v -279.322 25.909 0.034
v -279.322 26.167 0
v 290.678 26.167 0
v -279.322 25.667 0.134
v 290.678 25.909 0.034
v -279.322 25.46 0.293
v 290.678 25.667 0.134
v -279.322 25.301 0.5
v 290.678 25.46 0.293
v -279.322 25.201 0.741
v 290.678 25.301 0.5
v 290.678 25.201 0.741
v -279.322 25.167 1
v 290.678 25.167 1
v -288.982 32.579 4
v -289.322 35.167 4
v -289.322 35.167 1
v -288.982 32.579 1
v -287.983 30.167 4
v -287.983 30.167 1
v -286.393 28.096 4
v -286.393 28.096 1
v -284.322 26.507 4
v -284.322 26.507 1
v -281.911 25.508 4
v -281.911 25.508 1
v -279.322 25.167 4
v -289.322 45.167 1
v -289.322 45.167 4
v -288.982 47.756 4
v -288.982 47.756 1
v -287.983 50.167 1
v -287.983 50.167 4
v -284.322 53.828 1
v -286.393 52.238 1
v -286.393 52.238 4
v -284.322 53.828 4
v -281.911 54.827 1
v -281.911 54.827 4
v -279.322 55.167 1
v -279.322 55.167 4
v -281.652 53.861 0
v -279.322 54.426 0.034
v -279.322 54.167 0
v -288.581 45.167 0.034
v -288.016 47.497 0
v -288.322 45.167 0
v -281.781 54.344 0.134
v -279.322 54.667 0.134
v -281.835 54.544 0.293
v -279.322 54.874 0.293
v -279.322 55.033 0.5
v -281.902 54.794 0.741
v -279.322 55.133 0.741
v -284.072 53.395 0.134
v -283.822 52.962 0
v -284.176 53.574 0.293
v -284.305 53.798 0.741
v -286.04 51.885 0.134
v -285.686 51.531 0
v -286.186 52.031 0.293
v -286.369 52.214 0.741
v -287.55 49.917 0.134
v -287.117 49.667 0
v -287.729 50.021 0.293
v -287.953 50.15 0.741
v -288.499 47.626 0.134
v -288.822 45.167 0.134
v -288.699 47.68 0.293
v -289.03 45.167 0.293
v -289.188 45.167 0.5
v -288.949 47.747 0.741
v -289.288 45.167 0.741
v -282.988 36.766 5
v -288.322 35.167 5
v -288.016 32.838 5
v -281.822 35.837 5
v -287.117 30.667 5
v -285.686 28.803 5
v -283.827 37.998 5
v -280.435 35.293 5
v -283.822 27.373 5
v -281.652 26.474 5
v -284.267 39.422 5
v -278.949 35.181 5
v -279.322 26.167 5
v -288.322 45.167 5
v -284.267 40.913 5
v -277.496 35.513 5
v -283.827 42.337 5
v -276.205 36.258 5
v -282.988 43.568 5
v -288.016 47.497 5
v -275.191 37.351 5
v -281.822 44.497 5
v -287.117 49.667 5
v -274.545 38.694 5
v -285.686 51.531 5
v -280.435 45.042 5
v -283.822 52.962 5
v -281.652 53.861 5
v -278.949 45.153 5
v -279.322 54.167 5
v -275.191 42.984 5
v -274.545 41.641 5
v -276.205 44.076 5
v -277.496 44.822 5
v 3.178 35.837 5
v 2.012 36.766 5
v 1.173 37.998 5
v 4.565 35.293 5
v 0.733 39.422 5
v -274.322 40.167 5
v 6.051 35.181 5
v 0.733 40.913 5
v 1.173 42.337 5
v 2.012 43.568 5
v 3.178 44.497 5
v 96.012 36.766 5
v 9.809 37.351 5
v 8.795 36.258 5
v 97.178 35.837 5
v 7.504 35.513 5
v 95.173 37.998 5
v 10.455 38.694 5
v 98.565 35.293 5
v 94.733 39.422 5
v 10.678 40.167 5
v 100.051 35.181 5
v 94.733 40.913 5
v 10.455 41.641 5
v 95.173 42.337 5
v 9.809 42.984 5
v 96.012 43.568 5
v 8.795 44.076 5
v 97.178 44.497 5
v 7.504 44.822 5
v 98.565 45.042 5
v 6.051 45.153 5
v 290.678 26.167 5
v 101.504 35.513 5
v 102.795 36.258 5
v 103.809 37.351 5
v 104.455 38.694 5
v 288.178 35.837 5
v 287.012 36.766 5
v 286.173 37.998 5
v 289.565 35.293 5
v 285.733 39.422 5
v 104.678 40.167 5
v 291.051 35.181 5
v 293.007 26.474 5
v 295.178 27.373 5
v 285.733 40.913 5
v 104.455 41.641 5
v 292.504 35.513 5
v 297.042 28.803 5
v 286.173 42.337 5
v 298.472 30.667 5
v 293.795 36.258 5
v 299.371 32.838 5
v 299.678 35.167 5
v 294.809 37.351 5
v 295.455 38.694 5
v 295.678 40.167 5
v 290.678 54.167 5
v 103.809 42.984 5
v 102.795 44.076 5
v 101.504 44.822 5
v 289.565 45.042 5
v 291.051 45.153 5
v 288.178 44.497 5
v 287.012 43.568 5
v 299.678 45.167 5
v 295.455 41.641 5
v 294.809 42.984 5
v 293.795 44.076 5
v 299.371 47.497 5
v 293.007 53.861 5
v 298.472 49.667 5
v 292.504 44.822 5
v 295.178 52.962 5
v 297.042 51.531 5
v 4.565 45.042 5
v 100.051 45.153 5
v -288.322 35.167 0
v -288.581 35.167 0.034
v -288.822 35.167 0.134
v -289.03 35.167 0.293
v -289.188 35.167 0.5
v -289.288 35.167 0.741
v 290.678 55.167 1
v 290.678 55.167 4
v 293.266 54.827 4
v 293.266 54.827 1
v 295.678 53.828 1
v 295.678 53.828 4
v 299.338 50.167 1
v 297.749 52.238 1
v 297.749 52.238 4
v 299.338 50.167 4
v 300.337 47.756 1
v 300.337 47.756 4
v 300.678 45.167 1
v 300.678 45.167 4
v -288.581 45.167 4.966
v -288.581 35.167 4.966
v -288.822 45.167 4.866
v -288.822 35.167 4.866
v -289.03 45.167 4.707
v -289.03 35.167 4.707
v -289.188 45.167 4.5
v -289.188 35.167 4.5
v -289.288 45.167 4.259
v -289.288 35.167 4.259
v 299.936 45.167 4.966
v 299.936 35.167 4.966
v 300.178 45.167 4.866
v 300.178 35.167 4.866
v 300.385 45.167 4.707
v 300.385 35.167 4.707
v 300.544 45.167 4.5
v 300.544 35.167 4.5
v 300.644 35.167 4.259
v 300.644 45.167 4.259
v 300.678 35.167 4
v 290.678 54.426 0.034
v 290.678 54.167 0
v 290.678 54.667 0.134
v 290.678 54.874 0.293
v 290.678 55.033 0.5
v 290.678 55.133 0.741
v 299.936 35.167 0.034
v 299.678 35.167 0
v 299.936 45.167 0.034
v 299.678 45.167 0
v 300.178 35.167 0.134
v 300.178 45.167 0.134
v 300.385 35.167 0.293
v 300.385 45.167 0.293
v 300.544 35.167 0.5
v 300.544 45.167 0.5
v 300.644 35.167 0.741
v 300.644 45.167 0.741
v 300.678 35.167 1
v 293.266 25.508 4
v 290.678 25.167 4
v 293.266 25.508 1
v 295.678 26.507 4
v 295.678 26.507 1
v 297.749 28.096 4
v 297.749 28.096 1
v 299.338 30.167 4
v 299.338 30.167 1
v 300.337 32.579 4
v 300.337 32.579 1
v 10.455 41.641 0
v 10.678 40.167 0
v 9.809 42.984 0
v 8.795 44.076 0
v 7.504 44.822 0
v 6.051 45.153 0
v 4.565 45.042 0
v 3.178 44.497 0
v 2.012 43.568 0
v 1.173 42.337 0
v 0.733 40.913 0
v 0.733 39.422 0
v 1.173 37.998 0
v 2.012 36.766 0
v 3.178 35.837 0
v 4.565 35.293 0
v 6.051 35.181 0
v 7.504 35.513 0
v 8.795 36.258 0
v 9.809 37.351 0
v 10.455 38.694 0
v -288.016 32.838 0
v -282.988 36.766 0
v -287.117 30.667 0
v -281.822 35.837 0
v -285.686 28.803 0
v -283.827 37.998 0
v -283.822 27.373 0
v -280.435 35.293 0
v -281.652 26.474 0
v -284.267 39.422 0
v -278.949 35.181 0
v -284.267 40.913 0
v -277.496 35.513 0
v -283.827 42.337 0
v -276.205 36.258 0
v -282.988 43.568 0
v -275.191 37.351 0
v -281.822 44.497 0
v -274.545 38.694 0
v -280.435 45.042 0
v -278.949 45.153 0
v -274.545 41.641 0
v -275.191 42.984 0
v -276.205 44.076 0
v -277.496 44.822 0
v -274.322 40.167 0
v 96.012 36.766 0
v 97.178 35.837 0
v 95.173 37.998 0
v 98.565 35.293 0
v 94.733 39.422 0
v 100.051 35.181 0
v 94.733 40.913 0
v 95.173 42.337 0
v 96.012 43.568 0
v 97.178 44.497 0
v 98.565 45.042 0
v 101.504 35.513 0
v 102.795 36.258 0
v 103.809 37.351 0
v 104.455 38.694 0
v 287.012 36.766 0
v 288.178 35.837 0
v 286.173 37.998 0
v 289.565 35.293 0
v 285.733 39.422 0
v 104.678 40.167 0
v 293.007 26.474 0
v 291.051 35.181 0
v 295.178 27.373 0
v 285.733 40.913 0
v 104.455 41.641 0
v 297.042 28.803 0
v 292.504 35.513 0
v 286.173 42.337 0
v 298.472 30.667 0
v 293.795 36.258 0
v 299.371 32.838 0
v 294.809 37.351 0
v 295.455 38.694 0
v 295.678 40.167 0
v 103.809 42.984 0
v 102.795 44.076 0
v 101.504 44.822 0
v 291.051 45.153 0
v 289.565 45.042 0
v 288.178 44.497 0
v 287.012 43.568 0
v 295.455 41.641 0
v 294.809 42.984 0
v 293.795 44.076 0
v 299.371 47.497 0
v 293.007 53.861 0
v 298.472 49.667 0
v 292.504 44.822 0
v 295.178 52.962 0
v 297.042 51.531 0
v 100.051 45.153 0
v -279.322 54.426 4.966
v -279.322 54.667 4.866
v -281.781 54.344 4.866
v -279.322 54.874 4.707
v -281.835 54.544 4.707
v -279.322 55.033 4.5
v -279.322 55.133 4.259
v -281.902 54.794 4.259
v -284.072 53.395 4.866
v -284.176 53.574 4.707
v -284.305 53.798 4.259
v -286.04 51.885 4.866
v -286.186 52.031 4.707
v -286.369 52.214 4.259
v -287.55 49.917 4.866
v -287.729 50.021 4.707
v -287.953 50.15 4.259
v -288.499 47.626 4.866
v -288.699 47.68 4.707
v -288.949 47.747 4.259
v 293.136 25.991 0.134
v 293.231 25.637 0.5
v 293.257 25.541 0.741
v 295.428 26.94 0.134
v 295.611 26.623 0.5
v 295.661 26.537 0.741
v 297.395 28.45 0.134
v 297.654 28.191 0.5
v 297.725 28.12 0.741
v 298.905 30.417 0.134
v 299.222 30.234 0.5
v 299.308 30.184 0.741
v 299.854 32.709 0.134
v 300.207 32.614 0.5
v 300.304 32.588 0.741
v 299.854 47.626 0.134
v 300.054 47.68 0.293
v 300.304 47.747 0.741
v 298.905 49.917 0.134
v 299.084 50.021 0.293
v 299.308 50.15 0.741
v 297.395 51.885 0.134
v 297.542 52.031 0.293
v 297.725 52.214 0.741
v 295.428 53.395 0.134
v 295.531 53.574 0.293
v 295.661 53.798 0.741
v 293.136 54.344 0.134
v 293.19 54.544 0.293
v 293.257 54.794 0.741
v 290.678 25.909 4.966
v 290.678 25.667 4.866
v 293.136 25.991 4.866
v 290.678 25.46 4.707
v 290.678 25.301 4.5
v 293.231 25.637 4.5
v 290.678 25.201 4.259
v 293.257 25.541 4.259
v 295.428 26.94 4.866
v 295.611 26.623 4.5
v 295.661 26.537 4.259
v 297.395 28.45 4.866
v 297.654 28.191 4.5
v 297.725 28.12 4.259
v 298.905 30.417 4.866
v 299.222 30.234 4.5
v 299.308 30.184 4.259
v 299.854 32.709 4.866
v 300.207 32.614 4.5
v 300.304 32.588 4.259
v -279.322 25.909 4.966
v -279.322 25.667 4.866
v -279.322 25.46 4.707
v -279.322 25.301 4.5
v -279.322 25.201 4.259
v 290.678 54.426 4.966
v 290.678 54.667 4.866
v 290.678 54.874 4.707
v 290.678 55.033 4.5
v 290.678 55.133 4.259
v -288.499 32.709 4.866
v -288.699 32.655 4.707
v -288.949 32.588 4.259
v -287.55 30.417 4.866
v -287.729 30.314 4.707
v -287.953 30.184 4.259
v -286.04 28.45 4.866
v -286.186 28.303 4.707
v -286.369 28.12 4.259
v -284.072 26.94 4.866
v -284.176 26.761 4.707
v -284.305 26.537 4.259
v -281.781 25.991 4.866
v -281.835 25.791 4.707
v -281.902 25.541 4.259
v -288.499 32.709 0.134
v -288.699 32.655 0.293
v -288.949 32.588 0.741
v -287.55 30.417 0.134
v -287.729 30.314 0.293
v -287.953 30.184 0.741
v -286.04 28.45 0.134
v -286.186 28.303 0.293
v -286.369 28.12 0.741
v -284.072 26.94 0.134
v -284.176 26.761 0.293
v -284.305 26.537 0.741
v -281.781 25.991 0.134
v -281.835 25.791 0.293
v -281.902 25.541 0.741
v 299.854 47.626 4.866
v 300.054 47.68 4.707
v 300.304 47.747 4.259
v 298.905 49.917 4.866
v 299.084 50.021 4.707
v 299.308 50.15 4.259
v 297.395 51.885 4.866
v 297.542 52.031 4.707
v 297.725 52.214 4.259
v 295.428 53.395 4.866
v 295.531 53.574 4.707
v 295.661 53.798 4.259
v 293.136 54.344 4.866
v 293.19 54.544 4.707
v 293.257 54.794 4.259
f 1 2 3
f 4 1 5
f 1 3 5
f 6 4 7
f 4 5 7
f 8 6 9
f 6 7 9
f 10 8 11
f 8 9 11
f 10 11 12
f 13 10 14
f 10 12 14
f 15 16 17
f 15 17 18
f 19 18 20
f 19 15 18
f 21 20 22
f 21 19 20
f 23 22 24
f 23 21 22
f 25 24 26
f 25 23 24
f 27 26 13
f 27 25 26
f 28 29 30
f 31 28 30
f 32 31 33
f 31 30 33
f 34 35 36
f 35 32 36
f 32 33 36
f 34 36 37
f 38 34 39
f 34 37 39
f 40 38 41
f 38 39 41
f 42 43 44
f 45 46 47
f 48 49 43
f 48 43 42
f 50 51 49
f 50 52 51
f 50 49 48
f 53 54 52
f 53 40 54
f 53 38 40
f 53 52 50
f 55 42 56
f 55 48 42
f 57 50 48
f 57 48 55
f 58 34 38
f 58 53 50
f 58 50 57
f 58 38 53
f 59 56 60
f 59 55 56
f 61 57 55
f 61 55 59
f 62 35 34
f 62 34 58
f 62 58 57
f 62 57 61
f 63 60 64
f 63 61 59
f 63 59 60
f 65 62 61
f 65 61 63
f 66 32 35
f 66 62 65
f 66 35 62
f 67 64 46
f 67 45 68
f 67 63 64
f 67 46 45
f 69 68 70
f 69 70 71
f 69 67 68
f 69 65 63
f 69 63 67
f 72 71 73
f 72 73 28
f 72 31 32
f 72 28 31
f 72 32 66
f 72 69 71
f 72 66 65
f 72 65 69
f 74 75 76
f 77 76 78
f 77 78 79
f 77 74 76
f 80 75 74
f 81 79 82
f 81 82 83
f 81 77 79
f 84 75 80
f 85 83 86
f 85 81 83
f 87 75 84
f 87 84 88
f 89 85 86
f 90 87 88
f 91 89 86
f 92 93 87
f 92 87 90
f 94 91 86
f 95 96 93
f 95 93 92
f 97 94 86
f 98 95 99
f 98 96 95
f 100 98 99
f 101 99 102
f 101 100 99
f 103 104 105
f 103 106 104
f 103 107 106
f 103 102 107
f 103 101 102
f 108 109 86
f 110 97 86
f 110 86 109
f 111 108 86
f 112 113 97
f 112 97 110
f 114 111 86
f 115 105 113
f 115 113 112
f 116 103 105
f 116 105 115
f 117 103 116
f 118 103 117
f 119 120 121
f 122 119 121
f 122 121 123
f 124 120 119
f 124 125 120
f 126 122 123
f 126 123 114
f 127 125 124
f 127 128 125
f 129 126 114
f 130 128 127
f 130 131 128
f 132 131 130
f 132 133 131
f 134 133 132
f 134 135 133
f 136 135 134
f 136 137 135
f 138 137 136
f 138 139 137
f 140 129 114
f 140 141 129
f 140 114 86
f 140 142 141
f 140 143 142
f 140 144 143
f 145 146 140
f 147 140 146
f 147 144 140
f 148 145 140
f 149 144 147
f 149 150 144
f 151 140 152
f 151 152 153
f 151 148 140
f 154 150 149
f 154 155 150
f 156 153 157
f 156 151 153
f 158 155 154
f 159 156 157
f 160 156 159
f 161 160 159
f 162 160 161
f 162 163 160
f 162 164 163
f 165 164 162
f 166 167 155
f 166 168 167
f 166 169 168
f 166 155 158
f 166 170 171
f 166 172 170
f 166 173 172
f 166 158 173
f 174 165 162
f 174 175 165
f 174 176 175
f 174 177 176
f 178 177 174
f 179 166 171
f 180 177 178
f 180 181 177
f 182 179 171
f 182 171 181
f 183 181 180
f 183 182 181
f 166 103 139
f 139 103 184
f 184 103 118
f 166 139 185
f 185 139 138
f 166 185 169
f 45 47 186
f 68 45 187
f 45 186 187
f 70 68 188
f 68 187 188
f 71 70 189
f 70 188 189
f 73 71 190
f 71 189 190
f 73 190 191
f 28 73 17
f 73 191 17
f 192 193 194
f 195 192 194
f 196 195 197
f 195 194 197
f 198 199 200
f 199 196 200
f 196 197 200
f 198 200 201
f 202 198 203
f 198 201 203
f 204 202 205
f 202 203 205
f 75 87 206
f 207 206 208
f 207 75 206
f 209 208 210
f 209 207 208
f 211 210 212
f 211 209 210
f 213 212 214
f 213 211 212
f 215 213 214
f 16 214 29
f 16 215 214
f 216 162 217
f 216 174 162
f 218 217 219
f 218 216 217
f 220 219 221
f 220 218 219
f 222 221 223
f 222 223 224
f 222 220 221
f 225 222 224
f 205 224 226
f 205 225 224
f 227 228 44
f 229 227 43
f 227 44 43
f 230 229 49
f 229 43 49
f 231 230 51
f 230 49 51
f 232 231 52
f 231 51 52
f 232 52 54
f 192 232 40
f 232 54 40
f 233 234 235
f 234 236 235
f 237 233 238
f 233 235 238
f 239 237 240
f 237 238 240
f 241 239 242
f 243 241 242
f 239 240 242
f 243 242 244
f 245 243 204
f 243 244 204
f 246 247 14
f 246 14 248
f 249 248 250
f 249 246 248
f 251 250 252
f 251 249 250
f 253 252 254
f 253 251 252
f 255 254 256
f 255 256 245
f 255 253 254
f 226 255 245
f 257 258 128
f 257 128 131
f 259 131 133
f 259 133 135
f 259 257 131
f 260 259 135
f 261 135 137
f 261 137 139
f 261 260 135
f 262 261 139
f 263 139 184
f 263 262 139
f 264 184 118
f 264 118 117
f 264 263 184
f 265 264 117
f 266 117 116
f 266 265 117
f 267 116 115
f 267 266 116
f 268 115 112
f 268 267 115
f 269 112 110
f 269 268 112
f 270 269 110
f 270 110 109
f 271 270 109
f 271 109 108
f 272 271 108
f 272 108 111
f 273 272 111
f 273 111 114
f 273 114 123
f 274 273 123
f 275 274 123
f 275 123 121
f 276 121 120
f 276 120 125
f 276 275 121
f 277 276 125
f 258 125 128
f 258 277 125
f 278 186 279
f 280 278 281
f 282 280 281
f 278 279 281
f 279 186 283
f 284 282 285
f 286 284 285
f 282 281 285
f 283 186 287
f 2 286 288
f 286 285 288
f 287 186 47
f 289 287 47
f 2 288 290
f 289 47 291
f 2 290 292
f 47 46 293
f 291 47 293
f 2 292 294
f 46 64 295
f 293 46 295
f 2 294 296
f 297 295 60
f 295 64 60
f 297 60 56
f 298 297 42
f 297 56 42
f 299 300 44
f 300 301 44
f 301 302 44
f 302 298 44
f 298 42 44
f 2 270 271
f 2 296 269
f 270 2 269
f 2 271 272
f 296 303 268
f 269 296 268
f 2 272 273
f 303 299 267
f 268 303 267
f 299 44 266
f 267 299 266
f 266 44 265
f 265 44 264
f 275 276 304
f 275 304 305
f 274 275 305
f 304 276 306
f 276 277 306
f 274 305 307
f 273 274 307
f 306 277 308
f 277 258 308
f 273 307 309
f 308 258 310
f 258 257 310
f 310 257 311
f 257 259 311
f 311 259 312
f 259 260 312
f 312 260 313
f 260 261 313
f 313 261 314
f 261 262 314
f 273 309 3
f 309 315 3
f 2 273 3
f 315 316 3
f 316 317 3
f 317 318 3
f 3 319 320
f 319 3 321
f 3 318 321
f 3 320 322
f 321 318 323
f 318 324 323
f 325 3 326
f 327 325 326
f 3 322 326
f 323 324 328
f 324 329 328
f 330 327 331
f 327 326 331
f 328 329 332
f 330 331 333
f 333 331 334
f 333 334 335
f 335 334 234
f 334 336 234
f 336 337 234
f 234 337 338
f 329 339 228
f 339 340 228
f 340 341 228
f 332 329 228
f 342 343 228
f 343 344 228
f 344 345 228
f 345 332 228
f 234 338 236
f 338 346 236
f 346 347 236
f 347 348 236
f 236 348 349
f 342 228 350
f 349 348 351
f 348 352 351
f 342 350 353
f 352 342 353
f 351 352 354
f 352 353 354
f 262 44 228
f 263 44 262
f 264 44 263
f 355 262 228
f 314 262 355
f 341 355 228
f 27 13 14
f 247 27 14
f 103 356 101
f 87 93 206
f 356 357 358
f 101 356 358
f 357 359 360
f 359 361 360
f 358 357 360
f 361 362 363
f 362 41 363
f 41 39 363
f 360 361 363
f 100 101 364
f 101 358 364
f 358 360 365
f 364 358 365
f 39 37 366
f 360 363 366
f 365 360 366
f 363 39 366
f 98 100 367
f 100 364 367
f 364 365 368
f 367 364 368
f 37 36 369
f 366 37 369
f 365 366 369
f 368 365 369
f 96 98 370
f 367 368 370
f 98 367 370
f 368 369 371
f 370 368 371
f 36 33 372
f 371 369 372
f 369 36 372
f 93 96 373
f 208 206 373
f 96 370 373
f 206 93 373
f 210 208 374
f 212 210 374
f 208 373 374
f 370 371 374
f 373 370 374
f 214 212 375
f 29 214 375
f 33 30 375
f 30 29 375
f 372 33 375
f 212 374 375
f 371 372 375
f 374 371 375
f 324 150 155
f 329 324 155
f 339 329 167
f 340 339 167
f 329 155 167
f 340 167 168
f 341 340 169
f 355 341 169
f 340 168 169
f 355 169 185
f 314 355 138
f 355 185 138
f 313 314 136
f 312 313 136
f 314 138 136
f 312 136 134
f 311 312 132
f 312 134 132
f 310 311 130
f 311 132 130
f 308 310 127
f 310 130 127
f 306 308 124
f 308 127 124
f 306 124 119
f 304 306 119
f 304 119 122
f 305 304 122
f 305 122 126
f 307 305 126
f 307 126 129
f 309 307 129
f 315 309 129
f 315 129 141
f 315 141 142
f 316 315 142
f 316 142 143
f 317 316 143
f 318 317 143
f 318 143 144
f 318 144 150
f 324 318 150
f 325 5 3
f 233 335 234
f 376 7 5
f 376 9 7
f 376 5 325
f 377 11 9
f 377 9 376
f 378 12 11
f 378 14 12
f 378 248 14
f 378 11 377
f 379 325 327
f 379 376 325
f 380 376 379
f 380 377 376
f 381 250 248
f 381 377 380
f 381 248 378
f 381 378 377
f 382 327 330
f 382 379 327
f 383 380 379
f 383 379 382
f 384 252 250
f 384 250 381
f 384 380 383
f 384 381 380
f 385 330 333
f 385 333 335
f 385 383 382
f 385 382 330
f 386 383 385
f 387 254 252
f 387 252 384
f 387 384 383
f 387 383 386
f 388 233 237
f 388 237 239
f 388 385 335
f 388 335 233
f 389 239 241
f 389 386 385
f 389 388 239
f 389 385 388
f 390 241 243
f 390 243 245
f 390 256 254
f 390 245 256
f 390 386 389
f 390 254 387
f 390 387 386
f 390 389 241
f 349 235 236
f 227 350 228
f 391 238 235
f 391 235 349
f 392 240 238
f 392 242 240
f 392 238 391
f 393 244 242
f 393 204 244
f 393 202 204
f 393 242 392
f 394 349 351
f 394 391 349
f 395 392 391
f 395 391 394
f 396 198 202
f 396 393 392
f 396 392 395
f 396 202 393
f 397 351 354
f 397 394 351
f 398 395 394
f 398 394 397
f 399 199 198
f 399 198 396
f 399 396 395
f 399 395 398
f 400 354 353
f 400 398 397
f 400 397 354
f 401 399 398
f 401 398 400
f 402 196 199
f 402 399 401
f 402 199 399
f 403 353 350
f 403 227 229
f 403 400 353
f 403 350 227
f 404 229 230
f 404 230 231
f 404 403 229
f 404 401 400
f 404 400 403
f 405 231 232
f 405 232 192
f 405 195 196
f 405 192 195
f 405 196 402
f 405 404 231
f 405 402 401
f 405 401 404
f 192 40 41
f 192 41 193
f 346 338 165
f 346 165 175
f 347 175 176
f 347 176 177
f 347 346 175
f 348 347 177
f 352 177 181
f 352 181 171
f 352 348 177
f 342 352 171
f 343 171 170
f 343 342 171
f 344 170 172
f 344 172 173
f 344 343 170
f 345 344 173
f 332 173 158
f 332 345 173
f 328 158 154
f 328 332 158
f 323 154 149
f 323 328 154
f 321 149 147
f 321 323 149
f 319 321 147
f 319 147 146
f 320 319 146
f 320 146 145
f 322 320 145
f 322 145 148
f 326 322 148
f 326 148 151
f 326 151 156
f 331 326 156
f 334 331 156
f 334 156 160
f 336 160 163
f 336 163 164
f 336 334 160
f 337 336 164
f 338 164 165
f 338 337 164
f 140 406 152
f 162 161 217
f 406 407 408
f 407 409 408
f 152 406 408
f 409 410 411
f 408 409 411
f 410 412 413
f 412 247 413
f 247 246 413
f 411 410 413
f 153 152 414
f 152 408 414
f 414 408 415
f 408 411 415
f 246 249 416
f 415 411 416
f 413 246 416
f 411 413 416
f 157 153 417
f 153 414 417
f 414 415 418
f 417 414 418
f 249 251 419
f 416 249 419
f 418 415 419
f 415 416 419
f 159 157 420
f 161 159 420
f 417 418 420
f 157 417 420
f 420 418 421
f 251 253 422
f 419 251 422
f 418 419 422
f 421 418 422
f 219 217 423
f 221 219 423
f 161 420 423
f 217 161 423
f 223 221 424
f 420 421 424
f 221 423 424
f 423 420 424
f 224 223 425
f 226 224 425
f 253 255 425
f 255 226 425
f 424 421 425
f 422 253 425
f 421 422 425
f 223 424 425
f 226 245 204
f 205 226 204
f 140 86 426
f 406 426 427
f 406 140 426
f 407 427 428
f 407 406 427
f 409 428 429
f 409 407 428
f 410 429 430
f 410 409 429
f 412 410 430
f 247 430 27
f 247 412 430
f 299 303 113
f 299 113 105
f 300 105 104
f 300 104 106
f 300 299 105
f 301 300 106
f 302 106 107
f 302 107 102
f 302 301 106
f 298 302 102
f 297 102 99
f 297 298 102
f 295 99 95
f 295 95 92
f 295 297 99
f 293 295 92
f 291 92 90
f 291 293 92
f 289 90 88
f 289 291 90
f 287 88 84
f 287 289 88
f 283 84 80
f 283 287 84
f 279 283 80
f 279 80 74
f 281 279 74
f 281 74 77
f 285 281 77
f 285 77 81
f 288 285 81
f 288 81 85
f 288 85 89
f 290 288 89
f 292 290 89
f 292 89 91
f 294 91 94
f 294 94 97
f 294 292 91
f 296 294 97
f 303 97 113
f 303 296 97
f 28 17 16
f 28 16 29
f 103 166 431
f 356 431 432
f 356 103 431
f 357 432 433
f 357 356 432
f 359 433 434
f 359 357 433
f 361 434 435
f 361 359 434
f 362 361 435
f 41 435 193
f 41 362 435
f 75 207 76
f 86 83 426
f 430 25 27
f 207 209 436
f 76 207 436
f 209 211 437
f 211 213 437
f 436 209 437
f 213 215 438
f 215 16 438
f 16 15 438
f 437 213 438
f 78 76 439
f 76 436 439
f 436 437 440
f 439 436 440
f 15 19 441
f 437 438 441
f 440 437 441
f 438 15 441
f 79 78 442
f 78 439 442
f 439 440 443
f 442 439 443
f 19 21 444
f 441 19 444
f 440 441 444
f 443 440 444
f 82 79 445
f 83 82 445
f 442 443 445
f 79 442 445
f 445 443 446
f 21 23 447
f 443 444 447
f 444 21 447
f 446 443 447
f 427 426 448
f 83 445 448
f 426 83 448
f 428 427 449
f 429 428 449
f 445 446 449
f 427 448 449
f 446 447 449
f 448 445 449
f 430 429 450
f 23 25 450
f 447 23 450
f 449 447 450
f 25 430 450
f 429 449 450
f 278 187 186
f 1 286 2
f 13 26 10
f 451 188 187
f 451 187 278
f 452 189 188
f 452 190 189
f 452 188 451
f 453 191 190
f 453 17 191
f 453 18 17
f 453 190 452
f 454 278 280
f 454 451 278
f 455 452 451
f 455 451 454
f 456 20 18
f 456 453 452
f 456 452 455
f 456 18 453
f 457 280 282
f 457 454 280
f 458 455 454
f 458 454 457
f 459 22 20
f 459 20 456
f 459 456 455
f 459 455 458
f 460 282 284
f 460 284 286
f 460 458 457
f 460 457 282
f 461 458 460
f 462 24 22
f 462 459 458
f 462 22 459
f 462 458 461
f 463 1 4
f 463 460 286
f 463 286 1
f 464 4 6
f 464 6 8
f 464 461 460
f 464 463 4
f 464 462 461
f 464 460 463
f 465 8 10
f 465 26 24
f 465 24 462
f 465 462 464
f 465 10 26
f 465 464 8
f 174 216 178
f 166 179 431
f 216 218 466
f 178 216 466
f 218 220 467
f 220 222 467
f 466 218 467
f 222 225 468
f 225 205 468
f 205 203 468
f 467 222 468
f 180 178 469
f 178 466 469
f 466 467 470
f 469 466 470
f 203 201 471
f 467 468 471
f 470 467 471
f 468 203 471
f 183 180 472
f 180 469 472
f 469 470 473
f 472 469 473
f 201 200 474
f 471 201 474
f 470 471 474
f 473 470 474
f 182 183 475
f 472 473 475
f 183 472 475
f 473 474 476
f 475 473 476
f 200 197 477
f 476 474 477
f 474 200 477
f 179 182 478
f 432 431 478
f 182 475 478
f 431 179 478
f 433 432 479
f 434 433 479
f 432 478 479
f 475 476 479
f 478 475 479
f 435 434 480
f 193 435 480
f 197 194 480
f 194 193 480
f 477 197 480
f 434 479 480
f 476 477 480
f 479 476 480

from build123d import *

# Parameters (mm, degrees)
SKETCH_1_W          = 590
SKETCH_1_H          = 30
SKETCH_1_R          = 5
EXTRUDE_1_DEPTH     = 5
FILLET_1_R          = 10
FILLET_2_R          = 1
CUT_EXTRUDE_1_REACH = 307.738
SKETCH_2_R          = 5


with BuildPart() as part:
    # 스케치1 → 보스-돌출1 (new body)
    with BuildSketch(Plane.XY):
        with Locations((5.677604278, 40.167322835)):
            Rectangle(SKETCH_1_W, SKETCH_1_H)
        with Locations((-279.322395722, 40.167322835)):
            Circle(SKETCH_1_R, mode=Mode.SUBTRACT)
        with Locations((290.677604278, 40.167322835)):
            Circle(SKETCH_1_R, mode=Mode.SUBTRACT)
        with Locations((5.677604278, 40.167322835)):
            Circle(SKETCH_1_R, mode=Mode.SUBTRACT)
    extrude(amount=EXTRUDE_1_DEPTH)

    # 필렛1
    fillet_1_edges = [part.edges().sort_by_distance(p)[0] for p in [
        (-289.322395722, 55.167322835, 2.5),
        (300.677604278, 55.167322835, 2.5),
        (300.677604278, 25.167322835, 2.5),
        (-289.322395722, 25.167322835, 2.5),
    ]]
    fillet(fillet_1_edges, radius=FILLET_1_R)

    # 필렛2
    fillet_2_edges = [part.edges().sort_by_distance(p)[0] for p in [
        (300.677604278, 40.167322835, 0),
        (300.677604278, 40.167322835, 5),
        (-289.322395722, 40.167322835, 0),
        (5.677604278, 55.167322835, 0),
        (5.677604278, 25.167322835, 0),
        (-286.393463534, 52.238390647, 0),
        (-286.393463534, 28.096255023, 0),
        (297.748672089, 52.238390647, 0),
        (297.748672089, 28.096255023, 0),
        (5.677604278, 25.167322835, 5),
        (-289.322395722, 40.167322835, 5),
        (5.677604278, 55.167322835, 5),
        (-286.393463534, 52.238390647, 5),
        (-286.393463534, 28.096255023, 5),
        (297.748672089, 52.238390647, 5),
        (297.748672089, 28.096255023, 5),
    ]]
    fillet(fillet_2_edges, radius=FILLET_2_R)

    # 스케치2 → 컷-돌출1 (cut, up to next)
    with BuildSketch(Plane.XY.offset(5), mode=Mode.PRIVATE) as cut_extrude_1_sk1:
        with Locations((99.677604278, 40.167322835)):
            Circle(SKETCH_2_R)
    cut_extrude_1_tool1 = extrude(cut_extrude_1_sk1.sketch, amount=-CUT_EXTRUDE_1_REACH, mode=Mode.PRIVATE) & part.part
    add(cut_extrude_1_tool1.solids().sort_by_distance((99.677604, 40.167323, 5))[0], mode=Mode.SUBTRACT)


solid = part.part
